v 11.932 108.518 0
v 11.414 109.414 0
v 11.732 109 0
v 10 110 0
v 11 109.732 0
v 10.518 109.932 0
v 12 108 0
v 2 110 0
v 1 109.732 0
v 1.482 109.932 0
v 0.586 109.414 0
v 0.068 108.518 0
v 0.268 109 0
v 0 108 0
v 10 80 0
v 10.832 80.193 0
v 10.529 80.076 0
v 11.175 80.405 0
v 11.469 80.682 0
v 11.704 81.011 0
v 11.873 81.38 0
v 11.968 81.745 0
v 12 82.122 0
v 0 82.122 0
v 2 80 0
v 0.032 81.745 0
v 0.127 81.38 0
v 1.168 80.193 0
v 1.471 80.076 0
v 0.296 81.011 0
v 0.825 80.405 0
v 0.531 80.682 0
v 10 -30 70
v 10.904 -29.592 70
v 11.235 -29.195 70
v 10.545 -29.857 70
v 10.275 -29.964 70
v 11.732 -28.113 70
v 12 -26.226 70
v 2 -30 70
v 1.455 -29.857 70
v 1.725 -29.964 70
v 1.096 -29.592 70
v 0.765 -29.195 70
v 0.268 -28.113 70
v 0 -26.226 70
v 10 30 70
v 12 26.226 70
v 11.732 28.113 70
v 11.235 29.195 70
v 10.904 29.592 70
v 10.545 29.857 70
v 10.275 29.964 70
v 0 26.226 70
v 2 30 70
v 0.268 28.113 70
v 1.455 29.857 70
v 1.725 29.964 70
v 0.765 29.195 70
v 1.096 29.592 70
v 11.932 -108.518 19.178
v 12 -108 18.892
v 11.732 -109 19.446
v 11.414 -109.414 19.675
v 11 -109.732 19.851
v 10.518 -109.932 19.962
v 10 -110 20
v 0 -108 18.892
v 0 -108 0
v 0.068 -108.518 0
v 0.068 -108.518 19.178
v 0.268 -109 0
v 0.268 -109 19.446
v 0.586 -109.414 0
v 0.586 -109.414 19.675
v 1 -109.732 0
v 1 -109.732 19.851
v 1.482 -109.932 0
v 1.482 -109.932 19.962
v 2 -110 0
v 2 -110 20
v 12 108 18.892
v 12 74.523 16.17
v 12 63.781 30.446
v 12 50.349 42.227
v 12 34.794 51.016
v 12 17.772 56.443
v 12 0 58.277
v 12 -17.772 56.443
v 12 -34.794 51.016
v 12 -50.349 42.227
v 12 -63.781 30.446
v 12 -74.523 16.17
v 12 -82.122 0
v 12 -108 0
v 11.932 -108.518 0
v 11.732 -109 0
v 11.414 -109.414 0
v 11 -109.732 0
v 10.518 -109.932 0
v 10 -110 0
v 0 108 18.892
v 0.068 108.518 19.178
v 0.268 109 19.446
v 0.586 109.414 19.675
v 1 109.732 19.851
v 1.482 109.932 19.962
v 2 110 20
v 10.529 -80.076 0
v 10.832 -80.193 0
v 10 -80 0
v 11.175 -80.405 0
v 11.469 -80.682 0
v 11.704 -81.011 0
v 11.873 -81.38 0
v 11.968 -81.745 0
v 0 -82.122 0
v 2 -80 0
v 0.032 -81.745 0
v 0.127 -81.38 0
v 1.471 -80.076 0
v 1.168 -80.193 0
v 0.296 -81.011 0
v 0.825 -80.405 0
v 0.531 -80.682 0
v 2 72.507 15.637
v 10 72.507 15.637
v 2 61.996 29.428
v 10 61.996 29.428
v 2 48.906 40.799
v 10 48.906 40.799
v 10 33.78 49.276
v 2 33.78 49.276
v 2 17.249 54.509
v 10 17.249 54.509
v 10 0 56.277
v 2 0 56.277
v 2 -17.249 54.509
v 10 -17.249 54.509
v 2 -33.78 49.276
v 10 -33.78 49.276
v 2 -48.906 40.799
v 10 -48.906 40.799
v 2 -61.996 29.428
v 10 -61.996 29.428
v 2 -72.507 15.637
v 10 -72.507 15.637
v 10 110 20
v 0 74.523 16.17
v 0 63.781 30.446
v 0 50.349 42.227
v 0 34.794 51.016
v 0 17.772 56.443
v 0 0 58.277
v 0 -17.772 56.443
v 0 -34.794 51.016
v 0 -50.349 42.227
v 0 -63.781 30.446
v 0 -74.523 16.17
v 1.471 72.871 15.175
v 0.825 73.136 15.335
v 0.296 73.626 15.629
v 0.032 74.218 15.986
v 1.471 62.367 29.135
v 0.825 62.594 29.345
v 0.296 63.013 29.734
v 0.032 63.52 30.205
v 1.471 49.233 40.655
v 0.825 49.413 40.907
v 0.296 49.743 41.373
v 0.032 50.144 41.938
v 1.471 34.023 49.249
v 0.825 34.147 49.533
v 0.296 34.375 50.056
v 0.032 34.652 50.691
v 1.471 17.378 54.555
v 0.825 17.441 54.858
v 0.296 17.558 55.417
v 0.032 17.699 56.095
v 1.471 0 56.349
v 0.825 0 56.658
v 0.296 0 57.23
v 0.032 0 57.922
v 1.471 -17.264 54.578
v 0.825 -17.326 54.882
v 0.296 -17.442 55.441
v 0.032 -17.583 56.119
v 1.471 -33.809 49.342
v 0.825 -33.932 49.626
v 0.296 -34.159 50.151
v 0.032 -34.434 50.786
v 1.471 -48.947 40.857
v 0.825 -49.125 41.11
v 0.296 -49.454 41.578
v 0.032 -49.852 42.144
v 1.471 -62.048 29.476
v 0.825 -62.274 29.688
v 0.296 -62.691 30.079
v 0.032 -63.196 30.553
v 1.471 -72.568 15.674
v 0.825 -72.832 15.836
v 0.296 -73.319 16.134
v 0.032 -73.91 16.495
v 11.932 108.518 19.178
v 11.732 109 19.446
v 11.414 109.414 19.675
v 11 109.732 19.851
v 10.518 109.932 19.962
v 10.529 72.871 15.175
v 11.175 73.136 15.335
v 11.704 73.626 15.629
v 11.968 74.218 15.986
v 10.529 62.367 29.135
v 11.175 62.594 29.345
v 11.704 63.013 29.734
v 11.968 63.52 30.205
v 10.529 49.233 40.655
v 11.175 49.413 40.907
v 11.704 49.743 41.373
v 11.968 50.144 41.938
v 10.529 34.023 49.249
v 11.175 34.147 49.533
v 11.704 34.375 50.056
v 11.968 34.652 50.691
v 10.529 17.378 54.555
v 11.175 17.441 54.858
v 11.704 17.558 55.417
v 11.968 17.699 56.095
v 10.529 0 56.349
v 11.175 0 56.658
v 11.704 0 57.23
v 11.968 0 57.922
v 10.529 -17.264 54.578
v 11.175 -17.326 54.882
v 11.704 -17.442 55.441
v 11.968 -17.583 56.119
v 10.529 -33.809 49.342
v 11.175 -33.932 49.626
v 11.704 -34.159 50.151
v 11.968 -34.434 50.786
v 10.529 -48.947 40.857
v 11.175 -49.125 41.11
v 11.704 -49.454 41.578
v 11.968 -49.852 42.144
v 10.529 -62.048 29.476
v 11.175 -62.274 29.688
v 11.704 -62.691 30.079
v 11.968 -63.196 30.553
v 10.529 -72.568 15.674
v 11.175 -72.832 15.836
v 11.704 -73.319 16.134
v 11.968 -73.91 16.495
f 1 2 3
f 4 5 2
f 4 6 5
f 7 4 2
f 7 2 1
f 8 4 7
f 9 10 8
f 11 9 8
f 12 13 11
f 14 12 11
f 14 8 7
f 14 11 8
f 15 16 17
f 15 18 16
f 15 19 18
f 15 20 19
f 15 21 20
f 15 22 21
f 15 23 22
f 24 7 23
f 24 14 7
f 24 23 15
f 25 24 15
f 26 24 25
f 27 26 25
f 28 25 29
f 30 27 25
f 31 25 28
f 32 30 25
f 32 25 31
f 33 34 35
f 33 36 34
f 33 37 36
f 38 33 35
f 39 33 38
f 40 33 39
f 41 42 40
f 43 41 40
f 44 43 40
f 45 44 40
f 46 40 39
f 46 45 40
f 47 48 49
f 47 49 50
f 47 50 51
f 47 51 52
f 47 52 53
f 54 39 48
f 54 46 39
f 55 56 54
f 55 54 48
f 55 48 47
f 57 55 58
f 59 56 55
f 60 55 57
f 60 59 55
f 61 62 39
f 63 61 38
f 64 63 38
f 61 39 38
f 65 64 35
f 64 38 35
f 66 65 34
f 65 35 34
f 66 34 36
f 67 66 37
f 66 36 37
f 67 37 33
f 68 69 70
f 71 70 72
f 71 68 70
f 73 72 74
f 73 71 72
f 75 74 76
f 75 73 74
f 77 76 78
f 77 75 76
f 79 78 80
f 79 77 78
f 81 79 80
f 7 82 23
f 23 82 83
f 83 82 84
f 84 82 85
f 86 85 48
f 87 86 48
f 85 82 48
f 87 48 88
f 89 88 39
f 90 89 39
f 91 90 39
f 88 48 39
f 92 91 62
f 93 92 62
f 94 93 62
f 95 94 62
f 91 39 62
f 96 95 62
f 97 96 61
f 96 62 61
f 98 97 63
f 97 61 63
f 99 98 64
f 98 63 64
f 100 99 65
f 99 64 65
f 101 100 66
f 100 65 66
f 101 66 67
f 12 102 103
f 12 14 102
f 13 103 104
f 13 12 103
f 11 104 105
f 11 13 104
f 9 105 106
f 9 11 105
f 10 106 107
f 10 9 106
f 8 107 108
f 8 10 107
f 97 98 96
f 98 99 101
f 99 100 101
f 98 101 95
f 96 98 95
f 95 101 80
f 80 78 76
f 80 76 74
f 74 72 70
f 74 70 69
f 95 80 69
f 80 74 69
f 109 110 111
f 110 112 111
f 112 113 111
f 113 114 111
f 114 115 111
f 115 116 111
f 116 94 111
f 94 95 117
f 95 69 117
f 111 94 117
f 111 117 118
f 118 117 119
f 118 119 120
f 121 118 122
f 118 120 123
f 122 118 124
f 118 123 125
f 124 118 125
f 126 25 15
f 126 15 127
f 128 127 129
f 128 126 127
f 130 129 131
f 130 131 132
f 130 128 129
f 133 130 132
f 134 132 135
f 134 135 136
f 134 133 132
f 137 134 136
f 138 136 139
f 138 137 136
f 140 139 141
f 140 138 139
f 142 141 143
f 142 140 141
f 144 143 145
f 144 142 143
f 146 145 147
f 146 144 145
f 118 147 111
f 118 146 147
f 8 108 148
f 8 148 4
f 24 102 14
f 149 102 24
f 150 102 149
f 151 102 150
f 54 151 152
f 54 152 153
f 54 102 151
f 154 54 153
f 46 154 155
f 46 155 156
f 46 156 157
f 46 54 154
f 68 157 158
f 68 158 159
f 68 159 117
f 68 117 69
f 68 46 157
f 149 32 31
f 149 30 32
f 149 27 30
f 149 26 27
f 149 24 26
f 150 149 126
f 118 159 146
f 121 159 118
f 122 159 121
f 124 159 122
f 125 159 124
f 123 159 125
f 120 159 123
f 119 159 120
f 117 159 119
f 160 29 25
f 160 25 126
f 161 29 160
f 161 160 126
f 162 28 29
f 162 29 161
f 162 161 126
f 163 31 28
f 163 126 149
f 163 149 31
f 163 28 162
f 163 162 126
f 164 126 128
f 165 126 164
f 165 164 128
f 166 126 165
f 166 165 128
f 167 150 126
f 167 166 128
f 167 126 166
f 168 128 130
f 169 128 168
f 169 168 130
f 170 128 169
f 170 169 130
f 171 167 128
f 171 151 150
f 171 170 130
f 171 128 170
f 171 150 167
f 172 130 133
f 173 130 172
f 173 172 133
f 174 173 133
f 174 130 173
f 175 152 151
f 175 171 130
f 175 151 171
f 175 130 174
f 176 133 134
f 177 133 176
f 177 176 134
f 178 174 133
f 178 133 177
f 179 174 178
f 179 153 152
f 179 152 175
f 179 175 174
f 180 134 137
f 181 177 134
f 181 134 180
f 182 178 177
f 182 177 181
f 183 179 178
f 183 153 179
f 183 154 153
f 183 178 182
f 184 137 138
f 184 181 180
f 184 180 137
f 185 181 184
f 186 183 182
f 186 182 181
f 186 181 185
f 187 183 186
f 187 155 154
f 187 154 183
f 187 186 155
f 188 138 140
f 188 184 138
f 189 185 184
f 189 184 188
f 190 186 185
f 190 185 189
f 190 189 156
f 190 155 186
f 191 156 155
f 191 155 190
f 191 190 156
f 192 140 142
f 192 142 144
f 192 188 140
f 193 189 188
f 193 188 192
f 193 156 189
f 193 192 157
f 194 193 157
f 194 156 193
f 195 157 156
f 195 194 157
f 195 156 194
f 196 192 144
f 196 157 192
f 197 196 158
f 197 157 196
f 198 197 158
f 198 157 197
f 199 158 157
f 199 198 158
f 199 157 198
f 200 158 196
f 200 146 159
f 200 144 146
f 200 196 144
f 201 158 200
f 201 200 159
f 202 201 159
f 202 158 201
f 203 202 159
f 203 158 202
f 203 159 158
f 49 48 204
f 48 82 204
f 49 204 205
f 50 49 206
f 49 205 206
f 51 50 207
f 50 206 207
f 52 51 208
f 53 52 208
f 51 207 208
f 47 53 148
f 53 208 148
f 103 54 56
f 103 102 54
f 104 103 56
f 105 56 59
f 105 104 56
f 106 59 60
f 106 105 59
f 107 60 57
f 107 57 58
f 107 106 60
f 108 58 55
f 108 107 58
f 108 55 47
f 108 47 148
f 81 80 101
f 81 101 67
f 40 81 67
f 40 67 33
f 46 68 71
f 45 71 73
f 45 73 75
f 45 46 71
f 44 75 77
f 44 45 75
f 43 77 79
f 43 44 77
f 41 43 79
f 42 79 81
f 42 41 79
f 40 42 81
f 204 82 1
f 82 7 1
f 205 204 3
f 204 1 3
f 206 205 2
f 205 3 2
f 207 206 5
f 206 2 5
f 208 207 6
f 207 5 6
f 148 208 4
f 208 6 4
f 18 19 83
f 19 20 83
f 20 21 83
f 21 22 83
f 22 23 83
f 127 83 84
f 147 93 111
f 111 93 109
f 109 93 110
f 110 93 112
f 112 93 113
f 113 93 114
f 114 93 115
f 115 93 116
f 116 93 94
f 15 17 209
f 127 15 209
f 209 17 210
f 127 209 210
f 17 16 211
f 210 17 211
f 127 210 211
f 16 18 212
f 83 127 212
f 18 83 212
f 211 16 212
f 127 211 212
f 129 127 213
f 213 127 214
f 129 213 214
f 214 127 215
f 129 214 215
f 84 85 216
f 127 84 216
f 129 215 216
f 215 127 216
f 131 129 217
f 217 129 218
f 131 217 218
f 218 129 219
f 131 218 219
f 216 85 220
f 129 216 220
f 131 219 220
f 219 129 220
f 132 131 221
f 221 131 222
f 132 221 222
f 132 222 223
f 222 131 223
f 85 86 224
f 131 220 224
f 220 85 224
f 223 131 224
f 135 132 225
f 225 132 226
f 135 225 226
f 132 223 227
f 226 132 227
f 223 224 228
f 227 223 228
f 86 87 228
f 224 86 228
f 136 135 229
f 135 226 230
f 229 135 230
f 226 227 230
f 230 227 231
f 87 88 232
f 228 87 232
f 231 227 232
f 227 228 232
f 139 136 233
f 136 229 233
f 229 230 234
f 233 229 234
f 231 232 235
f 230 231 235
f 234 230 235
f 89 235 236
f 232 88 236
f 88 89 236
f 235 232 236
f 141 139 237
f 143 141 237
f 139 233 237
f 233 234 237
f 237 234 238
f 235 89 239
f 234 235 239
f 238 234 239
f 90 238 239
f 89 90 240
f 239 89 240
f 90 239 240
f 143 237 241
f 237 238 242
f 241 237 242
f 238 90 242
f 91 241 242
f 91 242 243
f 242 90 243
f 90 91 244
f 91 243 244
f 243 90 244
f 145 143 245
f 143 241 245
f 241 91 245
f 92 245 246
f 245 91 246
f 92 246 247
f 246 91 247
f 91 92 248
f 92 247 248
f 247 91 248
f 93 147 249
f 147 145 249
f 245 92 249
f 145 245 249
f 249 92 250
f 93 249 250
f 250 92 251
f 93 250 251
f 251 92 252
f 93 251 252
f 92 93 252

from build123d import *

# Parameters (mm, degrees)
PAD019_DEPTH = 12
FILLET005_R  = 2
FILLET006_R  = 2


with BuildPart() as part:
    # Sketch058 → Pad019 (new body)
    with BuildSketch(Plane.YZ):
        with BuildLine():
            Line((-110, 0), (-110, 20))
            Line((-110, 20), (-30, 70))
            Line((-30, 70), (30, 70))
            Line((30, 70), (110, 20))
            Line((110, 20), (110, 0))
            Line((110, 0), (80, 0))
            ThreePointArc((80, 0), (0, 56.277187), (-80, 0))
            Line((-110, 0), (-80, 0))
        make_face()
    extrude(amount=PAD019_DEPTH)

    # Fillet005
    fillet005_edges = [part.edges().sort_by_distance(p)[0] for p in [
        (0, 0, 56.277187),
        (12, 0, 56.277187),
    ]]
    fillet(fillet005_edges, radius=FILLET005_R)

    # Fillet006
    fillet006_edges = [part.edges().sort_by_distance(p)[0] for p in [
        (12, 70, 45),
        (0, 70, 45),
        (0, -70, 45),
        (12, -70, 45),
        (0, -110, 10),
        (12, -110, 10),
        (0, 110, 10),
        (12, 110, 10),
    ]]
    fillet(fillet006_edges, radius=FILLET006_R)


solid = part.part
